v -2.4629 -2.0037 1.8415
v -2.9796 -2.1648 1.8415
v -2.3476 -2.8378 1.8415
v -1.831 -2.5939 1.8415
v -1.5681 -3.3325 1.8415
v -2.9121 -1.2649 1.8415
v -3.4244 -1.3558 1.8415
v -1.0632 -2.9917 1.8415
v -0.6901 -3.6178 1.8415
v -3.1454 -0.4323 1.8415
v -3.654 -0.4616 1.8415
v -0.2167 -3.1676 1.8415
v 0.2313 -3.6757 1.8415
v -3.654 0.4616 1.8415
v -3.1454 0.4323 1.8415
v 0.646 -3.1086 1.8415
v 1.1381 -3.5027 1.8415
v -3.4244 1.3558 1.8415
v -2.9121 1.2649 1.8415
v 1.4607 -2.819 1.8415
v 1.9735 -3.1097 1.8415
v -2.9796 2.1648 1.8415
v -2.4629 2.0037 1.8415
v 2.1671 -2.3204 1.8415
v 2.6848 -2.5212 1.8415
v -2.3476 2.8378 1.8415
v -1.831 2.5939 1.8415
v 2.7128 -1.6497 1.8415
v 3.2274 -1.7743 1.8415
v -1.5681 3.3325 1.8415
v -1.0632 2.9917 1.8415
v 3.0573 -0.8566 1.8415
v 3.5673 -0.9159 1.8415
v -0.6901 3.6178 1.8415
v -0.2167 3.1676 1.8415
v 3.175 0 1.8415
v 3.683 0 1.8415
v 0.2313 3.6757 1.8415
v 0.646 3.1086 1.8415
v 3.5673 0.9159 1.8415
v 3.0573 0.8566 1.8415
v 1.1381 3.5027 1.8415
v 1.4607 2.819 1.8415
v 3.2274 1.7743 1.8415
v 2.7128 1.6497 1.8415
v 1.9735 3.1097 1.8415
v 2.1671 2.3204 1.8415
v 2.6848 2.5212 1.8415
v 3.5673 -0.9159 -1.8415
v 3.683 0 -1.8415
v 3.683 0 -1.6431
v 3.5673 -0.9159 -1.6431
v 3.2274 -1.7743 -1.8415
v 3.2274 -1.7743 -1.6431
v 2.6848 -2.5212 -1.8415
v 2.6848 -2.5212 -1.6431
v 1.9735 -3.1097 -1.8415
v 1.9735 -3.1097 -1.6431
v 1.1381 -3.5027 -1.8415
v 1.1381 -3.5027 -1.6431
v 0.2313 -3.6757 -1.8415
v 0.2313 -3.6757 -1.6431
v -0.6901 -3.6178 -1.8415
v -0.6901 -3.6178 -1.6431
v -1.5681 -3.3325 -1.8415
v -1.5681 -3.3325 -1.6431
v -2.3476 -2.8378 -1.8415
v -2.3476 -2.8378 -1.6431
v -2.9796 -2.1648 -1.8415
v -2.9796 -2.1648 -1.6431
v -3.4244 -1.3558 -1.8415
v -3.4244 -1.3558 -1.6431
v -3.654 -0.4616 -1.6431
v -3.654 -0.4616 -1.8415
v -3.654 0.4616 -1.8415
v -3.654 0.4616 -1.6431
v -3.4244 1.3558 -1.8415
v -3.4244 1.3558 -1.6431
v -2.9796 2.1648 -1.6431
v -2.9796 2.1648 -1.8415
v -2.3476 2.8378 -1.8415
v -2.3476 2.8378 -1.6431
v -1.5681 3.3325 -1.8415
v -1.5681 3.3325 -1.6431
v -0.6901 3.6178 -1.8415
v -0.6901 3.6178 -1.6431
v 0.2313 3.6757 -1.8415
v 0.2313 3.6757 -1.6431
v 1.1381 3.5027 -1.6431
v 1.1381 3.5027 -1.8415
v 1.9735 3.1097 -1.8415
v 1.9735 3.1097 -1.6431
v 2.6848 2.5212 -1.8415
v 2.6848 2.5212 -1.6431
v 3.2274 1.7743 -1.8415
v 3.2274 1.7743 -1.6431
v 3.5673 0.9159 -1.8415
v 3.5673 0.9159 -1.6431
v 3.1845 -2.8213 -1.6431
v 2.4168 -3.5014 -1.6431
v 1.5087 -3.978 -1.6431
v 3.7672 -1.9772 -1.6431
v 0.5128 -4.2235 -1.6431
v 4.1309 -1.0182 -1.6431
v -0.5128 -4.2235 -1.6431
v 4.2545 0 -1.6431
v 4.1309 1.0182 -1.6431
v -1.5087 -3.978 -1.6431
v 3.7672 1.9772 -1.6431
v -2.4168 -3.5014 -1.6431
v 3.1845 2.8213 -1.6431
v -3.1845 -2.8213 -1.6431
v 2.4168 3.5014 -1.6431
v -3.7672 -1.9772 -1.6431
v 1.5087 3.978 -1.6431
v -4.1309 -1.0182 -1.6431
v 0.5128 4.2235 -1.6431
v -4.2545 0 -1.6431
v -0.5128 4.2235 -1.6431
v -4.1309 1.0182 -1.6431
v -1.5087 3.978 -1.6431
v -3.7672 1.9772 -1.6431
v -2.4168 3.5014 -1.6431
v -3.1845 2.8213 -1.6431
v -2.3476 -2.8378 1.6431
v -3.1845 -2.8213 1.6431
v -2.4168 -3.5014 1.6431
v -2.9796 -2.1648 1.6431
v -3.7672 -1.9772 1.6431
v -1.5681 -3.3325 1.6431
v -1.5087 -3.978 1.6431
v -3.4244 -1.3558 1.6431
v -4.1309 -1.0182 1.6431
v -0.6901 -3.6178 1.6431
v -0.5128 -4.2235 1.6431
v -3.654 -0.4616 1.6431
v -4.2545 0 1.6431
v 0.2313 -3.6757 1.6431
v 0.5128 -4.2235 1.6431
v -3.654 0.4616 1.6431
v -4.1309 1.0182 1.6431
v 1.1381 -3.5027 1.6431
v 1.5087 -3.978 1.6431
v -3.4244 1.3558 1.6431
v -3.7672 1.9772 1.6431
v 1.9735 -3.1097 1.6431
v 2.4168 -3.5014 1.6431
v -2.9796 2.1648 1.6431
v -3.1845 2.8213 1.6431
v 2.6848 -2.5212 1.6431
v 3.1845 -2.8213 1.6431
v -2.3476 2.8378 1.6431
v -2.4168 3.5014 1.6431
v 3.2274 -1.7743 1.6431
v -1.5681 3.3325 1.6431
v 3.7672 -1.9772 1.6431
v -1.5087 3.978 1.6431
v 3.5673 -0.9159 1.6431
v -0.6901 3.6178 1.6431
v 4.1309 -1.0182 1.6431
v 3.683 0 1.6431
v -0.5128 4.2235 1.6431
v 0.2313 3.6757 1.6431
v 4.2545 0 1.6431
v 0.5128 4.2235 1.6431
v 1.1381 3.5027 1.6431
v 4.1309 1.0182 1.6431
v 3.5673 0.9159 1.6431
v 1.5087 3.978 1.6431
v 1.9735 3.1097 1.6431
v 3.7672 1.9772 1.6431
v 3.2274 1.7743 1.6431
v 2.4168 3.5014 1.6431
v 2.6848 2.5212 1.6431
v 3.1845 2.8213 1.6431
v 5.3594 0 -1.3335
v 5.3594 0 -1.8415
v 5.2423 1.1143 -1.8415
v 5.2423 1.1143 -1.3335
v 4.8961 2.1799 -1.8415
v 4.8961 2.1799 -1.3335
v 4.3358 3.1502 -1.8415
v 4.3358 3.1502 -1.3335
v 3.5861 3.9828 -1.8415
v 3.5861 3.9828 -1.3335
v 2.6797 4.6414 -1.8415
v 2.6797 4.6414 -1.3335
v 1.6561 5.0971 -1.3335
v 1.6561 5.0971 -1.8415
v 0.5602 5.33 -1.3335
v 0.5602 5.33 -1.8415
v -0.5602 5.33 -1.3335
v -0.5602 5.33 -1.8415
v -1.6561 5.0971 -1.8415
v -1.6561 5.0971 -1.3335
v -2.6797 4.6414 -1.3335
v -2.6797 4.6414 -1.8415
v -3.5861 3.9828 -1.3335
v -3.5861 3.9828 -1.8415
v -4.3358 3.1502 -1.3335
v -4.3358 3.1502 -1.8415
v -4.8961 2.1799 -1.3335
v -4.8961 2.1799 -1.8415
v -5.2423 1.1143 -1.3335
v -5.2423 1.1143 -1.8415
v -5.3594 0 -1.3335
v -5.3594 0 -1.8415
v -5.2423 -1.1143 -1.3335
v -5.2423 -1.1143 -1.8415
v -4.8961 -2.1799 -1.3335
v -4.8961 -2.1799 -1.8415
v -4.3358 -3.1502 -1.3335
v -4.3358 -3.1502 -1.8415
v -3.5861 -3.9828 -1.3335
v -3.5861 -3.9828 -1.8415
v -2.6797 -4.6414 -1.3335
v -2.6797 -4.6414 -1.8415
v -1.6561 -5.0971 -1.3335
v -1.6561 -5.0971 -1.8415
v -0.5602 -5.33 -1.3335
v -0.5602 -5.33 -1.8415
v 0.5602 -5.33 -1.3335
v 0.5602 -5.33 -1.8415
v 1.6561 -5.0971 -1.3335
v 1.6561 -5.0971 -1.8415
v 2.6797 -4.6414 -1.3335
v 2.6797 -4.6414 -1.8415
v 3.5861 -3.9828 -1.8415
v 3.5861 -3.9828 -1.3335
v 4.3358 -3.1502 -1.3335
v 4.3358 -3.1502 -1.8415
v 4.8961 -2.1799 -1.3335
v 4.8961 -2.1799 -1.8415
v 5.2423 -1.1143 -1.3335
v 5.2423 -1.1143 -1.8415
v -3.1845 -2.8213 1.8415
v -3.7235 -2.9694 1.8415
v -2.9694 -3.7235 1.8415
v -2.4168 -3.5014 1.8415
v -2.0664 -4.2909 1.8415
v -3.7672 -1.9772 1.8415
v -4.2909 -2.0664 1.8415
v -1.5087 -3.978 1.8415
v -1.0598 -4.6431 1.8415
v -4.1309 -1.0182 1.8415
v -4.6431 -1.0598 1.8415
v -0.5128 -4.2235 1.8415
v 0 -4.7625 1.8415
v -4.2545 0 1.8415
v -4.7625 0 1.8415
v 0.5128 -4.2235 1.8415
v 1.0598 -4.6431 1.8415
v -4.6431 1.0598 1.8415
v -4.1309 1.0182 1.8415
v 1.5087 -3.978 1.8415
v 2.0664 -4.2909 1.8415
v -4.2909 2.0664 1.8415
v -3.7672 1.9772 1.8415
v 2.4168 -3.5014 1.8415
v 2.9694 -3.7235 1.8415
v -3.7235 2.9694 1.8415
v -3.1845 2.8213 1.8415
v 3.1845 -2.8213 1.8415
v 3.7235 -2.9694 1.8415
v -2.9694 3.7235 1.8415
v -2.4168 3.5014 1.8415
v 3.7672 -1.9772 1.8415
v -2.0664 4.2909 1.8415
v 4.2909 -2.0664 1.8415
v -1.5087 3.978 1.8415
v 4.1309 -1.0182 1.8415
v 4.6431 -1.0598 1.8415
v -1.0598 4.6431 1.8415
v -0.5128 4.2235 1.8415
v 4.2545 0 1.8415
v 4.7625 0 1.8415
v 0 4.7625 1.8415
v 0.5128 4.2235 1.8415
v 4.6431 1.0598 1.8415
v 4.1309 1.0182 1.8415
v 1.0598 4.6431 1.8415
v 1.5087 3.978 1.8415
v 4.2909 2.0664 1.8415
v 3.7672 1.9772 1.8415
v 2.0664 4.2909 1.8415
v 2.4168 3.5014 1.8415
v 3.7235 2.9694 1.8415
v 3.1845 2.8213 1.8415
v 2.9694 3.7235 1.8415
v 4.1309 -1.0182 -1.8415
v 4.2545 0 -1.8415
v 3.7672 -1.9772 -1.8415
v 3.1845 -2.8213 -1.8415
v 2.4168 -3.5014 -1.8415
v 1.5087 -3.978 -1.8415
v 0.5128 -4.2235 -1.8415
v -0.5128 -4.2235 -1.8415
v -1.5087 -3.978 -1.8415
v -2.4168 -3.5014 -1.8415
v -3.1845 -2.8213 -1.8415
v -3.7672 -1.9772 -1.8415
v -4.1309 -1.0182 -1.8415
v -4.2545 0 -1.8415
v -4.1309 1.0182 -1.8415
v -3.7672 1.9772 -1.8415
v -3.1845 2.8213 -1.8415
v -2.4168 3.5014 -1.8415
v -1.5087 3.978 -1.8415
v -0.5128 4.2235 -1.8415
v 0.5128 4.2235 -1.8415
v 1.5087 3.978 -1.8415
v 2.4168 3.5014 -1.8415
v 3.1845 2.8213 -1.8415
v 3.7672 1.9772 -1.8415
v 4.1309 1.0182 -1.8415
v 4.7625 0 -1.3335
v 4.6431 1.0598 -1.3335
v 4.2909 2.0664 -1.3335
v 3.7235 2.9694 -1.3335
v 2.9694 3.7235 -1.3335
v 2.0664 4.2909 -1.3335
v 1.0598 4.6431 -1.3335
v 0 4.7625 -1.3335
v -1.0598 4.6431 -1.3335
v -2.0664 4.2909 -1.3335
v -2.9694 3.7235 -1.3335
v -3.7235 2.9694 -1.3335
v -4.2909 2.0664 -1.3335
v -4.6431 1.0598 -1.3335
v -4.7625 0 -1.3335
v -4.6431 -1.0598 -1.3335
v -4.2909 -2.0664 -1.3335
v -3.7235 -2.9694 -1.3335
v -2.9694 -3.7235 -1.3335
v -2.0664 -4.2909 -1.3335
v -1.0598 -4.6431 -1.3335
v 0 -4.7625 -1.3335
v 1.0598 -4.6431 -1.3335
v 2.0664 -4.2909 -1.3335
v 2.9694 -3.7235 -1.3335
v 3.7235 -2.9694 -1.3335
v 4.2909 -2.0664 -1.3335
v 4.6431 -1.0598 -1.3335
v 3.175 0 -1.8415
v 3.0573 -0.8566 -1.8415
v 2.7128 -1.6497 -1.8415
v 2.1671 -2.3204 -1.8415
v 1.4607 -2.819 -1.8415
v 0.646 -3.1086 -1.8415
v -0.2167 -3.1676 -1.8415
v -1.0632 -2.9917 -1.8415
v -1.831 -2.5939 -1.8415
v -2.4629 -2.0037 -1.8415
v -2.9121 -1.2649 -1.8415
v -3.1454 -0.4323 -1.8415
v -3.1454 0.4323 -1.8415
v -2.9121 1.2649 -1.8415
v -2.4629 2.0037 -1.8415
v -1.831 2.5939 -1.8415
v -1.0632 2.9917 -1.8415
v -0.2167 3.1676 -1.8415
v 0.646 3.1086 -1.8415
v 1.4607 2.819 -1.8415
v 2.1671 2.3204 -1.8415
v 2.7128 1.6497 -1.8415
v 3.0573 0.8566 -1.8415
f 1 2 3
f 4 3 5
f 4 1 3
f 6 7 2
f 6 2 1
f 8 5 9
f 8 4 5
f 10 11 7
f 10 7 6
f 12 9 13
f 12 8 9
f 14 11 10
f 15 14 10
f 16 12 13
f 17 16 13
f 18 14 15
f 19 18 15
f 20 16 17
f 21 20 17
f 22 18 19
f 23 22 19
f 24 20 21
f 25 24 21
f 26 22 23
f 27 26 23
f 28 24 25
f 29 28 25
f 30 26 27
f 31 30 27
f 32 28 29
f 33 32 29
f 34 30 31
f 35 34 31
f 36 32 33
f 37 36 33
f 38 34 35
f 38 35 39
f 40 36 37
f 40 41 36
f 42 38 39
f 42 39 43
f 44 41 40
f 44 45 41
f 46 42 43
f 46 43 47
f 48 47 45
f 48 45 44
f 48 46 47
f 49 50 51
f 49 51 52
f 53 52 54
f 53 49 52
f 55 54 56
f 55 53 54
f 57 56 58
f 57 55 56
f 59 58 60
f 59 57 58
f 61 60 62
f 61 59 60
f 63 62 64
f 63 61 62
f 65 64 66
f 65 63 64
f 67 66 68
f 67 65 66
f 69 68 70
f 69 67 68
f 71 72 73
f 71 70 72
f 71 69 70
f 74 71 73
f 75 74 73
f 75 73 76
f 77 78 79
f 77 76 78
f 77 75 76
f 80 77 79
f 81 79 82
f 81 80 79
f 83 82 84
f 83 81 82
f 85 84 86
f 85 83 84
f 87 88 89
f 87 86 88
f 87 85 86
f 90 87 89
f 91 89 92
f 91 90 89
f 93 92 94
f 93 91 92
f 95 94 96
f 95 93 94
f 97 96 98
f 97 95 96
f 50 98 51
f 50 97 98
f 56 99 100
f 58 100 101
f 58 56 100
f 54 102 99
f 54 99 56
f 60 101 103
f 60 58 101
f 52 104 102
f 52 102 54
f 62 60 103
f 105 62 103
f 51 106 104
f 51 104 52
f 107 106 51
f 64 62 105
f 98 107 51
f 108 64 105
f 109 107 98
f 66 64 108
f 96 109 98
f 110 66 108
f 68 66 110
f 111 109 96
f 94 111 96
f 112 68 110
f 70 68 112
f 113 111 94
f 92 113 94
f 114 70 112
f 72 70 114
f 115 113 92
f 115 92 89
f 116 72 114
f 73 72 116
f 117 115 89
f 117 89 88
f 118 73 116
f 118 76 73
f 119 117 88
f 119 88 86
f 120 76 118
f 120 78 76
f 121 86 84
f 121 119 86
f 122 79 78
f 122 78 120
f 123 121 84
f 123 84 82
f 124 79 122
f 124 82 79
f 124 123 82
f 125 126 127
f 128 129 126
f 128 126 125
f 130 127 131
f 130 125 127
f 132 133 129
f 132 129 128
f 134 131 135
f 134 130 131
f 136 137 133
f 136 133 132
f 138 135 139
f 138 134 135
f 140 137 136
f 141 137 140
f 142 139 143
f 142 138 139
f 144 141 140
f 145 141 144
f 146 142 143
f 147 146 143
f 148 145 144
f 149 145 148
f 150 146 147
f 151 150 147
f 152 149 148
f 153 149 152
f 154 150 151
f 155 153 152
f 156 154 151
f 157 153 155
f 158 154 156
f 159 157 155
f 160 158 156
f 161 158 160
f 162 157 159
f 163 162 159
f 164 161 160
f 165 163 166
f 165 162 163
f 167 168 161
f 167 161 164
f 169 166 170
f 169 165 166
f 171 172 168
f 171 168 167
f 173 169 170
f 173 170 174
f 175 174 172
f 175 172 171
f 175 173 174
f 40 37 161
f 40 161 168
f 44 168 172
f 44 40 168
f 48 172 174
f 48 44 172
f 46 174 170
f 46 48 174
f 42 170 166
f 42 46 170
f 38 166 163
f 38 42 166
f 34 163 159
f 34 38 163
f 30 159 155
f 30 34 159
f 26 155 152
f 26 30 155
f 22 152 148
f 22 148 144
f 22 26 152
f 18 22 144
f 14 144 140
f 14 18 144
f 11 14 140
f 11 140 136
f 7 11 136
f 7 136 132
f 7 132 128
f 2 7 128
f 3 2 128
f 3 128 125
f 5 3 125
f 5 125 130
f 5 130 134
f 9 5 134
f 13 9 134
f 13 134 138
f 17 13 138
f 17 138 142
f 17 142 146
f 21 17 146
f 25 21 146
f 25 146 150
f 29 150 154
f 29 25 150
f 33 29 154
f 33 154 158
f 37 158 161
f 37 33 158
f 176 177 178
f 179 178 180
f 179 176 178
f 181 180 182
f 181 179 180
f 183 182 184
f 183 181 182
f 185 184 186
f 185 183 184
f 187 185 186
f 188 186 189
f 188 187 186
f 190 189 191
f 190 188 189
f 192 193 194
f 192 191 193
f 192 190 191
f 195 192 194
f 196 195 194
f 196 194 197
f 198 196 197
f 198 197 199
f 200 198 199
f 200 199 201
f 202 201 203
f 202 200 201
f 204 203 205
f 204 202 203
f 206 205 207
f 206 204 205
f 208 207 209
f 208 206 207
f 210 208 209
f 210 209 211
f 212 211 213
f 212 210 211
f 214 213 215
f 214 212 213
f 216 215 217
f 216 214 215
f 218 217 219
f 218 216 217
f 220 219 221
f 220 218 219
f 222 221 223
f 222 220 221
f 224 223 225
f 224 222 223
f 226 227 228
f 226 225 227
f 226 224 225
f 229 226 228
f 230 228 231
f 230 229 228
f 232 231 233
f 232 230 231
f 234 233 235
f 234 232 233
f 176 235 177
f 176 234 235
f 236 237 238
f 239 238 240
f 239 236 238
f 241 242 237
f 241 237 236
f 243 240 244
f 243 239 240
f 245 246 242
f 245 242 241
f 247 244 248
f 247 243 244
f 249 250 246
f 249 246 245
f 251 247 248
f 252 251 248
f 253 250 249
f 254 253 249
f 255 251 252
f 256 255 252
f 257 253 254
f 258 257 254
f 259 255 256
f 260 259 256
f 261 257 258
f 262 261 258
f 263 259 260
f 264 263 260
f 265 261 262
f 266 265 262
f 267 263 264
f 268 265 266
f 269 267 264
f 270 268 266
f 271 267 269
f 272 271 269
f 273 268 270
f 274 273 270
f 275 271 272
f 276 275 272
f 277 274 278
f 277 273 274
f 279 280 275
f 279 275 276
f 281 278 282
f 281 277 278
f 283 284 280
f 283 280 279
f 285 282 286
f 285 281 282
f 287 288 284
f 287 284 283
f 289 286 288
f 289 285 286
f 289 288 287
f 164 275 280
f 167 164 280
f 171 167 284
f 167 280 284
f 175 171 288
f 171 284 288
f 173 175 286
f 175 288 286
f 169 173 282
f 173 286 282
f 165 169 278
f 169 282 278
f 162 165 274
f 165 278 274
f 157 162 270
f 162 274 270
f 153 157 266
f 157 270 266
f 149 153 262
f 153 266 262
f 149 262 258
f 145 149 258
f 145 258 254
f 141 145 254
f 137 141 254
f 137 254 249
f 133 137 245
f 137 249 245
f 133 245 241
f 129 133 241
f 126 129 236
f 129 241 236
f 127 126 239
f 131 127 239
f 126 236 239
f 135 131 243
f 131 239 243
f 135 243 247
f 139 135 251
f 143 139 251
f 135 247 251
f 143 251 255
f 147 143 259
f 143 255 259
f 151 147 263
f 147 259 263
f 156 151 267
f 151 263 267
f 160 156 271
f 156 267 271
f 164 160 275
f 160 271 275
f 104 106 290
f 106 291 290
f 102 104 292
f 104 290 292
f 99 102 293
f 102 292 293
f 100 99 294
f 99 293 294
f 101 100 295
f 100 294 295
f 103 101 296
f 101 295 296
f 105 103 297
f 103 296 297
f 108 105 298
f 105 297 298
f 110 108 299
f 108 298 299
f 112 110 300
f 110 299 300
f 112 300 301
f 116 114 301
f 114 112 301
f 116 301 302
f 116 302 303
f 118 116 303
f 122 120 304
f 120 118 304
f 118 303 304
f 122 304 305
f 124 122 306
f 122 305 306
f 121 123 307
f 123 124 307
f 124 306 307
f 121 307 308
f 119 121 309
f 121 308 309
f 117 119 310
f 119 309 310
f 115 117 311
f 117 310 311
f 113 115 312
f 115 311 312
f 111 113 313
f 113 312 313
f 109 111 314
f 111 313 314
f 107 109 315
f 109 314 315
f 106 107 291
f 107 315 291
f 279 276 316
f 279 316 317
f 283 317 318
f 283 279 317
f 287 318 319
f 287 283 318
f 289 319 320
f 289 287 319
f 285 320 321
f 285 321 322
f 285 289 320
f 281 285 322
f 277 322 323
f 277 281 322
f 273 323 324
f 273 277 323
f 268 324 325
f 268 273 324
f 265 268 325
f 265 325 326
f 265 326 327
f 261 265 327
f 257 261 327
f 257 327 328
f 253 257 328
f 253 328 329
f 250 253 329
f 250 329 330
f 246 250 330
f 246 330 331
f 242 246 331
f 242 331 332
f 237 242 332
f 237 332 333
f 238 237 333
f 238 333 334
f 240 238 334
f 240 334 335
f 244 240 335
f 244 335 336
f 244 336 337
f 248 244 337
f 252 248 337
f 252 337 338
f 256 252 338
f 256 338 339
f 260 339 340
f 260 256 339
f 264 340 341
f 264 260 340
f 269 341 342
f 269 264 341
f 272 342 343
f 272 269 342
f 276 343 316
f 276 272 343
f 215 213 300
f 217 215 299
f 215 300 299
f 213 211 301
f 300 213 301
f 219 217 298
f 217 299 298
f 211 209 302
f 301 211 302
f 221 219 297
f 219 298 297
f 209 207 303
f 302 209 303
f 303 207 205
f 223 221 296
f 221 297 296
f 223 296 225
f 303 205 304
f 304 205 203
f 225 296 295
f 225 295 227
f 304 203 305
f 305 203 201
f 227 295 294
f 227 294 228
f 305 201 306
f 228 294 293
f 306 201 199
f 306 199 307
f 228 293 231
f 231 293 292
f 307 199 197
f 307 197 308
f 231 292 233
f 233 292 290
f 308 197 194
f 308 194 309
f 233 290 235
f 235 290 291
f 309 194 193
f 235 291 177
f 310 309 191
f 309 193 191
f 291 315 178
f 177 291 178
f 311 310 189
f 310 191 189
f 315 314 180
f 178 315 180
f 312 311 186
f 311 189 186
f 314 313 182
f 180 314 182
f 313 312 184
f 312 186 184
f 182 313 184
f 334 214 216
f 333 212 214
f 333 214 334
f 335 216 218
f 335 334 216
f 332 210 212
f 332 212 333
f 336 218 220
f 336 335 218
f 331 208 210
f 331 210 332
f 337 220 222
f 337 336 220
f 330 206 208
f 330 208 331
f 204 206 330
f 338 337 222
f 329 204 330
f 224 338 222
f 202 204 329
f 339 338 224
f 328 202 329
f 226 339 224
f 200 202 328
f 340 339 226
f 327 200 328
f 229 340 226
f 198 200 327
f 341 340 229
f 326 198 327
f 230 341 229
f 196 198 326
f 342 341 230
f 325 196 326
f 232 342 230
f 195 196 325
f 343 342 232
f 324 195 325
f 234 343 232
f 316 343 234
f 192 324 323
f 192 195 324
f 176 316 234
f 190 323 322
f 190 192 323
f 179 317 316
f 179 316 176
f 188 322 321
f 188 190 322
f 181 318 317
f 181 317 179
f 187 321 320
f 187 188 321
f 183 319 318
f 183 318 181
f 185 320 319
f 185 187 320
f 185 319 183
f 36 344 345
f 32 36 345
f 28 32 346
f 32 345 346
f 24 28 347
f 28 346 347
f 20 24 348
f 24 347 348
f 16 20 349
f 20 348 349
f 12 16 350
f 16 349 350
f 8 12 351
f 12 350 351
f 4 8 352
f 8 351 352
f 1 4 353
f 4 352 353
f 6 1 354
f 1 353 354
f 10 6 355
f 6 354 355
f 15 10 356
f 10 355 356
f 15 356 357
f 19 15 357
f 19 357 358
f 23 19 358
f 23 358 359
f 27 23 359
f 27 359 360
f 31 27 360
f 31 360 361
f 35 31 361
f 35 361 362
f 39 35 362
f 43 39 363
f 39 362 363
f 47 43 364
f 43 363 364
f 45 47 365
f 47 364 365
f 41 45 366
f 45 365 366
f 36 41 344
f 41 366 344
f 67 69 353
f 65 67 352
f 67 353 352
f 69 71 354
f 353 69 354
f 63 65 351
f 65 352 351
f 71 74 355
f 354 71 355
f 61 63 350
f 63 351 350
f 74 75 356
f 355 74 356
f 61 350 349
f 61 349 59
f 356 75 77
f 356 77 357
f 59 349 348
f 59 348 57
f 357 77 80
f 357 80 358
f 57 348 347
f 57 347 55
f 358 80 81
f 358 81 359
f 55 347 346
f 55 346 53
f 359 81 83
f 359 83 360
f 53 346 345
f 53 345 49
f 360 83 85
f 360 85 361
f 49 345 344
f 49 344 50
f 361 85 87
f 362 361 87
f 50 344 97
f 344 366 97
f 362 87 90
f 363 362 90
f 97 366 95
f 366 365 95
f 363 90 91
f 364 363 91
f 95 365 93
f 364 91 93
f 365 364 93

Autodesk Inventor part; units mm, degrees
ref_plane "YZ Plane" through (0, 0, 0) normal (1, 0, 0) x (0, 1, 0)
ref_plane "XZ Plane" through (0, 0, 0) normal (0, 1, 0) x (-1, 0, 0)
ref_plane "XY Plane" through (0, 0, 0) normal (0, 0, 1) x (1, 0, 0)
sketch "Sketch1" plane through (0, 0, 0) normal (0, 0, 1) x (1, 0, 0)
  line L0 (-7.5032, 0) -> (7.5032, 0) projected
  line L1 (0, -7.5032) -> (0, 7.5032) projected
  circle A0 centre (0, 0) radius 5.3594
  circle A1 centre (0, 0) radius 3.175
  dimension "d0" = 6.35
  dimension "d1" = 10.7188
extrude "Base" add sketch "Sketch1" along normal mid plane 3.683 contours A1 L1 A0 L0 | L0 A0 L1 A1 | A1 L0 A0 L1 | L1 A0 L0 A1
sketch "Sketch2" plane through (0, 0, 1.8415) normal (0, 0, 1) x (1, 0, 0)
  circle A0 centre (0, 0) radius 5.3594 projected
  circle A1 centre (0, 0) radius 4.7625
  dimension "d4" = 9.525
extrude "Flange Cutaway" cut sketch "Sketch2" against normal blind 3.175
sketch "Sketch3" plane through (0, 0, 1.8415) normal (0, 0, 1) x (1, 0, 0)
  circle A0 centre (0, 0) radius 3.175 projected
  circle A1 centre (0, 0) radius 4.7625 projected
  circle A2 centre (0, 0) radius 3.683
  circle A3 centre (0, 0) radius 4.2545
  dimension "d11" = 0.508
  dimension "d12" = 0.508
extrude "Cutaway" cut sketch "Sketch3" against normal blind 0.1984 contours A3
mirror "Mirror1" about plane through (0, 0, 0) normal (0, 0, 1) of "Cutaway"
properties part number "bearing_1.125OD" material "Steel"
